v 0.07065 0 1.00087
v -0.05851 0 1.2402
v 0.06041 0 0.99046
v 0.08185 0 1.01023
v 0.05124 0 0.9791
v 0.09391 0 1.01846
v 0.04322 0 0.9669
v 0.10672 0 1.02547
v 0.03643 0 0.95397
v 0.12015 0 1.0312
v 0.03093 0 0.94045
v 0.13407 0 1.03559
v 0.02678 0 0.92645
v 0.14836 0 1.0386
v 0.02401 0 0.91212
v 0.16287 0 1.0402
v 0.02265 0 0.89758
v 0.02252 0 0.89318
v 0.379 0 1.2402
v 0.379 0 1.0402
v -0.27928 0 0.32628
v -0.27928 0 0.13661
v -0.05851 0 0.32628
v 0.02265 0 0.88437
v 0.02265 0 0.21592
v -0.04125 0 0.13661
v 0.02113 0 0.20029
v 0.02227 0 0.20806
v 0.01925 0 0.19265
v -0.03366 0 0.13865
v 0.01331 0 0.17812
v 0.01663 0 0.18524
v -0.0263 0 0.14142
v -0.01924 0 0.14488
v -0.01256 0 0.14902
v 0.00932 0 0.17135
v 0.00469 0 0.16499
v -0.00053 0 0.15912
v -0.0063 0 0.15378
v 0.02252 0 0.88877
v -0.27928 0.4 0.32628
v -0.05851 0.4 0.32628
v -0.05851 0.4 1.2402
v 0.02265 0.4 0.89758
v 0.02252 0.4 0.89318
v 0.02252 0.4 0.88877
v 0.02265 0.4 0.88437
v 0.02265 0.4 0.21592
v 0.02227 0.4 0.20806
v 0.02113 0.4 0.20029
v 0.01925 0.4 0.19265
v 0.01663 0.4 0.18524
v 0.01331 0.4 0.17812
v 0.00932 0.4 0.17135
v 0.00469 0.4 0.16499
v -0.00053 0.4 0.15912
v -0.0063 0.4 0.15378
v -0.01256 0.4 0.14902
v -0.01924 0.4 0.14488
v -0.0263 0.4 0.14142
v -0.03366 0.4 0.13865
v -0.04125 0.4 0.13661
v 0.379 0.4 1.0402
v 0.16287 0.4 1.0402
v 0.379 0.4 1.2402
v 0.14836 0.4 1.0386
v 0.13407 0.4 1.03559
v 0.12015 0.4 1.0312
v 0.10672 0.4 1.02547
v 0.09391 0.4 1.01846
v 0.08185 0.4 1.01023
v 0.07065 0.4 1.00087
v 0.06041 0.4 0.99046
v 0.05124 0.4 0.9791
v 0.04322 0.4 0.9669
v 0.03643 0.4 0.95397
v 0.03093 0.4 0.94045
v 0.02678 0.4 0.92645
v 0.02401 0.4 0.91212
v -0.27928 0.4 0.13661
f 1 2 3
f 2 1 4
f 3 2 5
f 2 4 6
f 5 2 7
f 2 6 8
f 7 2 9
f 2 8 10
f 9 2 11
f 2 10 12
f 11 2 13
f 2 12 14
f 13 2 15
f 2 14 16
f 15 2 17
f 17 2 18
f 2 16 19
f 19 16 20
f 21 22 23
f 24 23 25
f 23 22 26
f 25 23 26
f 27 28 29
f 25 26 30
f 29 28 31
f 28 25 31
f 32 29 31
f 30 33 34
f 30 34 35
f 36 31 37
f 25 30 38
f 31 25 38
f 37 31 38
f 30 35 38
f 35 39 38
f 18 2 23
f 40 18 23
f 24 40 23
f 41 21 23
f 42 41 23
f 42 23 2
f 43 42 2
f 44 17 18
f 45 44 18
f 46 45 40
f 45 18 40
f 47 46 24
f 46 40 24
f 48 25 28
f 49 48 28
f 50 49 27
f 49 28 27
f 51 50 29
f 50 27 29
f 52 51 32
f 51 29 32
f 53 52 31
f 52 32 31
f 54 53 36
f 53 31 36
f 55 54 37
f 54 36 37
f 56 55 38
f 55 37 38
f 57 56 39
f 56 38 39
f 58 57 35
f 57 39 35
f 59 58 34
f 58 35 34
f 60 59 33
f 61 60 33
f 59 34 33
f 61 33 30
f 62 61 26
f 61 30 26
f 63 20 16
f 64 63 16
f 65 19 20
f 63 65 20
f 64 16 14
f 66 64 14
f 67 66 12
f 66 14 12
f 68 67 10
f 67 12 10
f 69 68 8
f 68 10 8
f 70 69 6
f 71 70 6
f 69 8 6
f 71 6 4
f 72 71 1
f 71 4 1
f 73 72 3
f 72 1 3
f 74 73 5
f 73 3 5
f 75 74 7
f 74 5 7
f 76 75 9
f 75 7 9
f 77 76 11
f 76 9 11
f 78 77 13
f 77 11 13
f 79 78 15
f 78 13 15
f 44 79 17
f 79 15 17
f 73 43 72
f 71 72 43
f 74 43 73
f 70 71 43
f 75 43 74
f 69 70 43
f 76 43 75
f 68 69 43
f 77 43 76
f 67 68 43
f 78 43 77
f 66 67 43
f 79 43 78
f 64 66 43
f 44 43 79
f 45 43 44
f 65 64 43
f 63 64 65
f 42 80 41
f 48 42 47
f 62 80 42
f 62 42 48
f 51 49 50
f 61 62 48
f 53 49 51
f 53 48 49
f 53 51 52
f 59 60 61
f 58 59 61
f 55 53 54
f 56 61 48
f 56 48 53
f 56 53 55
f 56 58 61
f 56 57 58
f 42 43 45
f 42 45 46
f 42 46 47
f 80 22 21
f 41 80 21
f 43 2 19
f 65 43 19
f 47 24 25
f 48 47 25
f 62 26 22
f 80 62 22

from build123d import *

# Parameters (mm, degrees)
BOSS_EXTRUDE2_DEPTH = 0.4


with BuildPart() as part:
    # Sketch1 → Boss-Extrude2 (new body)
    with BuildSketch(Plane(origin=(0, 0, 0), x_dir=(1, 0, 0), z_dir=(0, 1, 0))):
        with BuildLine():
            Line((0.378997958, -1.040203981), (0.162867241, -1.040203981))
            ThreePointArc((0.162867241, -1.040203981), (0.065400257, -0.995788853), (0.022652214, -0.897579274))
            ThreePointArc((0.022652214, -0.897579274), (0.02250618, -0.890972759), (0.022652214, -0.884366245))
            Line((0.022652214, -0.884366245), (0.022652214, -0.215915587))
            ThreePointArc((0.022652214, -0.215915587), (0.004689259, -0.164992849), (-0.041248332, -0.136610975))
            Line((-0.041248332, -0.136610975), (-0.279282769, -0.136610975))
            Line((-0.279282769, -0.136610975), (-0.279282769, -0.326283695))
            Line((-0.279282769, -0.326283695), (-0.058509075, -0.326283695))
            Line((-0.058509075, -0.326283695), (-0.058509075, -1.240203981))
            Line((-0.058509075, -1.240203981), (0.202867241, -1.240203981))
            Line((0.202867241, -1.240203981), (0.378997958, -1.240203981))
            Line((0.378997958, -1.240203981), (0.378997958, -1.040203981))
        make_face()
    extrude(amount=BOSS_EXTRUDE2_DEPTH)


solid = part.part
